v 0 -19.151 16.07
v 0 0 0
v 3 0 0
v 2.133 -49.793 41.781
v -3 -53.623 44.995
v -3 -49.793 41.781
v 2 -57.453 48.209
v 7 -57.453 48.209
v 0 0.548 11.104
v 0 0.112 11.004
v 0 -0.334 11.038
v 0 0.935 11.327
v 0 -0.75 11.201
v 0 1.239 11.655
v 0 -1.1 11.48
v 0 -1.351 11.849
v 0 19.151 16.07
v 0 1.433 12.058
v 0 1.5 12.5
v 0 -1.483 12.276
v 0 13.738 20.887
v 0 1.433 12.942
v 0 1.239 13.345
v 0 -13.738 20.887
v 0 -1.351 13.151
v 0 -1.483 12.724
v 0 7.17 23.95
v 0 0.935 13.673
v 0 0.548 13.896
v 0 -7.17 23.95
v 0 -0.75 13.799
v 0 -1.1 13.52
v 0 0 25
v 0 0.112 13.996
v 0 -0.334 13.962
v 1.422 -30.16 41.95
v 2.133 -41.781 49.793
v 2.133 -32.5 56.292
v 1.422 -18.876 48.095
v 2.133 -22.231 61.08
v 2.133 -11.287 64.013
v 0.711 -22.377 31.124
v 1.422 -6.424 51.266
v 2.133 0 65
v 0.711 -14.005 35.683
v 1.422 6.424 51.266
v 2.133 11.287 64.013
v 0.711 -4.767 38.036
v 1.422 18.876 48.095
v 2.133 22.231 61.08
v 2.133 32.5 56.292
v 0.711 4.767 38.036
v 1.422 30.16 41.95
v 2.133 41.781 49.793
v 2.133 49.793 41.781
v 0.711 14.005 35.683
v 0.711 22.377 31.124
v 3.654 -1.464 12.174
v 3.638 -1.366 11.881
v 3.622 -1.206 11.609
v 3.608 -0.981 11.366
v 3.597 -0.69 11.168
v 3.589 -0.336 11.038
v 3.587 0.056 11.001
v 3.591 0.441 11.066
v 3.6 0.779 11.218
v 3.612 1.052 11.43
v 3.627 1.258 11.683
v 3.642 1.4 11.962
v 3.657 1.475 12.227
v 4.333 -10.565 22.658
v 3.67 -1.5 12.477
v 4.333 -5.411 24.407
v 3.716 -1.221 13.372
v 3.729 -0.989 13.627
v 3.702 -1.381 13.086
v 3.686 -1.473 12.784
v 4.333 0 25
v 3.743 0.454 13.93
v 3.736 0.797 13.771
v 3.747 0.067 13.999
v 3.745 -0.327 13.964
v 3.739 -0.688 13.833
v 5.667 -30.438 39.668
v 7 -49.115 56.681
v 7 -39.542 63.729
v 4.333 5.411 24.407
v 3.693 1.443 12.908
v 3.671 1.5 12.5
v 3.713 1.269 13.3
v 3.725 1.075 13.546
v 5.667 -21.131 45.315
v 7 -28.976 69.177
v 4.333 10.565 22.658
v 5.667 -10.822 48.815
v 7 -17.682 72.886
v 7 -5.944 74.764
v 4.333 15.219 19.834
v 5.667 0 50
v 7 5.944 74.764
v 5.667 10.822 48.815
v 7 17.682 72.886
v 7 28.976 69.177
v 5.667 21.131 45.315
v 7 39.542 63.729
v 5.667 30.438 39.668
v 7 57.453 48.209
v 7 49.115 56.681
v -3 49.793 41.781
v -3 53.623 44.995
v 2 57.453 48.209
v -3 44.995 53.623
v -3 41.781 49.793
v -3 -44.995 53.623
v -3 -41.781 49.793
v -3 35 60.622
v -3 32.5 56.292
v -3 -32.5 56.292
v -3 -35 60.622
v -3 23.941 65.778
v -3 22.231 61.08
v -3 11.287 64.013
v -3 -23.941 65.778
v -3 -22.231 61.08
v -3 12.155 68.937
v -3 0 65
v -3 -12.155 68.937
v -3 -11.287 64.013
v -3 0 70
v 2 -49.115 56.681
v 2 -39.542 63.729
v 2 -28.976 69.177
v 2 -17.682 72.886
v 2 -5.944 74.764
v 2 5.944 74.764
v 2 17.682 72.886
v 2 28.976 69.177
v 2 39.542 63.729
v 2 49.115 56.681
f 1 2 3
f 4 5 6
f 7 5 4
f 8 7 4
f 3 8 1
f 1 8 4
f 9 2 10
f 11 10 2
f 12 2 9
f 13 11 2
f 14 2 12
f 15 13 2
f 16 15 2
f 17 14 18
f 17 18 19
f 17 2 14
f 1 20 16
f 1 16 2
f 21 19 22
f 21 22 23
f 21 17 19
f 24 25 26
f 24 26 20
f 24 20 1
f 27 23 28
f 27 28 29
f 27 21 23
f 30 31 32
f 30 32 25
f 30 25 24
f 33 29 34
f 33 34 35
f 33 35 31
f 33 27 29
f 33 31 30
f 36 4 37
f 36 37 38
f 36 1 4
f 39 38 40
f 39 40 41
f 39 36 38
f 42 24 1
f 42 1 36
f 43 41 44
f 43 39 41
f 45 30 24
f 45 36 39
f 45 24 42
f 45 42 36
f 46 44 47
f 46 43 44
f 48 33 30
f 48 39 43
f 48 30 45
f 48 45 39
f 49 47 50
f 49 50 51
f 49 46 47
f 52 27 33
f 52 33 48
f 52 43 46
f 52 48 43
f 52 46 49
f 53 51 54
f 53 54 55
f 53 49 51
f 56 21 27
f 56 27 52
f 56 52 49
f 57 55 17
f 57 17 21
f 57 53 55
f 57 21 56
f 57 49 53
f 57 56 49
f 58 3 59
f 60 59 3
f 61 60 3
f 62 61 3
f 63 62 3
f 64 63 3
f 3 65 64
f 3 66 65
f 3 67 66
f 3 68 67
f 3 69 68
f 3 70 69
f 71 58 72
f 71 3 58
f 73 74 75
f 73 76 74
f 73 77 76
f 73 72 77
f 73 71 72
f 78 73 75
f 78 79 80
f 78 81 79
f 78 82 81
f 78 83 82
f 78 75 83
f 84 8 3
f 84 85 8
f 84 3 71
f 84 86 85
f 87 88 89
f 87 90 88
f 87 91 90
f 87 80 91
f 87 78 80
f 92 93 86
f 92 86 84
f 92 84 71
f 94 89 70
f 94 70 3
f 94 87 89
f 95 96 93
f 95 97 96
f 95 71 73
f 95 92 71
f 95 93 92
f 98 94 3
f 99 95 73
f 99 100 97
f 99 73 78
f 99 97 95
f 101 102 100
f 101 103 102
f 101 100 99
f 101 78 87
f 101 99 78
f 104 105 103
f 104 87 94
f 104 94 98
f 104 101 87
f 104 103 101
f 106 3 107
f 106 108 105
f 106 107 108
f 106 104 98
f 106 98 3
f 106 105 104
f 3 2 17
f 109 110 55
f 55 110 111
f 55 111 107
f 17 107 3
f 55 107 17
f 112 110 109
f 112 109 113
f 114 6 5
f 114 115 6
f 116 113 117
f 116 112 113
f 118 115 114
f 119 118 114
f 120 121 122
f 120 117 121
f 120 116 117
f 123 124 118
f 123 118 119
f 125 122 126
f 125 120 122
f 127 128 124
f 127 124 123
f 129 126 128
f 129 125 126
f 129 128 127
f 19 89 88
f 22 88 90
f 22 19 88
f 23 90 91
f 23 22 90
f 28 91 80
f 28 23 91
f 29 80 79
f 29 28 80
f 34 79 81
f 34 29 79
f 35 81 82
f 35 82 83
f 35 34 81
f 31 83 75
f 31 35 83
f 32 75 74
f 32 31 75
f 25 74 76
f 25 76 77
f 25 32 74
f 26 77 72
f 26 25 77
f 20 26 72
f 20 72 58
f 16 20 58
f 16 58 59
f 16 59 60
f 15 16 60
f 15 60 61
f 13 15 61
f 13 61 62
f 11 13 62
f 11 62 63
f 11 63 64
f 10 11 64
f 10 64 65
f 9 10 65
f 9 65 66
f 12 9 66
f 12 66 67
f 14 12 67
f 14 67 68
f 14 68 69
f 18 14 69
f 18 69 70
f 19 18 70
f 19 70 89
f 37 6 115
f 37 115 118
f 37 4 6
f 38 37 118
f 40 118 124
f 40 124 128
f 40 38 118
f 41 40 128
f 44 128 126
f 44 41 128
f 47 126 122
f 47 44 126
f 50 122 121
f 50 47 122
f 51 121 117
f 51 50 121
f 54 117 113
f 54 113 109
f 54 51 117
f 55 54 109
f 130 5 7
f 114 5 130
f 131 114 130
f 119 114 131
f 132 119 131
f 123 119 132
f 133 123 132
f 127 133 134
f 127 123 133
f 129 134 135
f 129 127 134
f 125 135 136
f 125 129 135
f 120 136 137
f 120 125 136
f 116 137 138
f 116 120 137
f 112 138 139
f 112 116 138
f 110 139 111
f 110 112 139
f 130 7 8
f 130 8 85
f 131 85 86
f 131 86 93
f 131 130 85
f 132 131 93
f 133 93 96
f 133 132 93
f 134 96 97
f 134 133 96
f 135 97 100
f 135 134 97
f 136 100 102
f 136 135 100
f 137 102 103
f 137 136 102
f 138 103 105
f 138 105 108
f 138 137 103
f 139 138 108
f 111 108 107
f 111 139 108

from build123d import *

# Parameters (mm, degrees)
F1_ANGLE_BACK = 50
F1_ANGLE      = 100
F2_SIZE       = 5
F3_R          = 1.5
F4_DEPTH      = 3.7476667667


with BuildPart() as f1:
    # F0 (on Front) → F1 (revolve)
    with BuildSketch(Plane.XZ, mode=Mode.PRIVATE) as f1_sk:
        Polygon((3, 0), (7, 75), (-3, 75), (-3, 65), (2.1333333333, 65), (0, 25), (0, 0), align=None)
    revolve(f1_sk.sketch.rotate(Axis((1.5, 0, 0), (-1, 0, 0)), -F1_ANGLE_BACK), axis=Axis((1.5, 0, 0), (-1, 0, 0)), revolution_arc=F1_ANGLE)

    # F2
    f2_edges = [f1.edges().sort_by_distance(p)[0] for p in [
        (-3, 0, 75),
    ]]
    chamfer(f2_edges, length=F2_SIZE)

    # F3 (on Right) → F4 (cut, through all)
    with BuildSketch(Plane.YZ):
        with Locations((0, 12.5)):
            Circle(F3_R)
    extrude(amount=F4_DEPTH, mode=Mode.SUBTRACT)


solid = f1.part
